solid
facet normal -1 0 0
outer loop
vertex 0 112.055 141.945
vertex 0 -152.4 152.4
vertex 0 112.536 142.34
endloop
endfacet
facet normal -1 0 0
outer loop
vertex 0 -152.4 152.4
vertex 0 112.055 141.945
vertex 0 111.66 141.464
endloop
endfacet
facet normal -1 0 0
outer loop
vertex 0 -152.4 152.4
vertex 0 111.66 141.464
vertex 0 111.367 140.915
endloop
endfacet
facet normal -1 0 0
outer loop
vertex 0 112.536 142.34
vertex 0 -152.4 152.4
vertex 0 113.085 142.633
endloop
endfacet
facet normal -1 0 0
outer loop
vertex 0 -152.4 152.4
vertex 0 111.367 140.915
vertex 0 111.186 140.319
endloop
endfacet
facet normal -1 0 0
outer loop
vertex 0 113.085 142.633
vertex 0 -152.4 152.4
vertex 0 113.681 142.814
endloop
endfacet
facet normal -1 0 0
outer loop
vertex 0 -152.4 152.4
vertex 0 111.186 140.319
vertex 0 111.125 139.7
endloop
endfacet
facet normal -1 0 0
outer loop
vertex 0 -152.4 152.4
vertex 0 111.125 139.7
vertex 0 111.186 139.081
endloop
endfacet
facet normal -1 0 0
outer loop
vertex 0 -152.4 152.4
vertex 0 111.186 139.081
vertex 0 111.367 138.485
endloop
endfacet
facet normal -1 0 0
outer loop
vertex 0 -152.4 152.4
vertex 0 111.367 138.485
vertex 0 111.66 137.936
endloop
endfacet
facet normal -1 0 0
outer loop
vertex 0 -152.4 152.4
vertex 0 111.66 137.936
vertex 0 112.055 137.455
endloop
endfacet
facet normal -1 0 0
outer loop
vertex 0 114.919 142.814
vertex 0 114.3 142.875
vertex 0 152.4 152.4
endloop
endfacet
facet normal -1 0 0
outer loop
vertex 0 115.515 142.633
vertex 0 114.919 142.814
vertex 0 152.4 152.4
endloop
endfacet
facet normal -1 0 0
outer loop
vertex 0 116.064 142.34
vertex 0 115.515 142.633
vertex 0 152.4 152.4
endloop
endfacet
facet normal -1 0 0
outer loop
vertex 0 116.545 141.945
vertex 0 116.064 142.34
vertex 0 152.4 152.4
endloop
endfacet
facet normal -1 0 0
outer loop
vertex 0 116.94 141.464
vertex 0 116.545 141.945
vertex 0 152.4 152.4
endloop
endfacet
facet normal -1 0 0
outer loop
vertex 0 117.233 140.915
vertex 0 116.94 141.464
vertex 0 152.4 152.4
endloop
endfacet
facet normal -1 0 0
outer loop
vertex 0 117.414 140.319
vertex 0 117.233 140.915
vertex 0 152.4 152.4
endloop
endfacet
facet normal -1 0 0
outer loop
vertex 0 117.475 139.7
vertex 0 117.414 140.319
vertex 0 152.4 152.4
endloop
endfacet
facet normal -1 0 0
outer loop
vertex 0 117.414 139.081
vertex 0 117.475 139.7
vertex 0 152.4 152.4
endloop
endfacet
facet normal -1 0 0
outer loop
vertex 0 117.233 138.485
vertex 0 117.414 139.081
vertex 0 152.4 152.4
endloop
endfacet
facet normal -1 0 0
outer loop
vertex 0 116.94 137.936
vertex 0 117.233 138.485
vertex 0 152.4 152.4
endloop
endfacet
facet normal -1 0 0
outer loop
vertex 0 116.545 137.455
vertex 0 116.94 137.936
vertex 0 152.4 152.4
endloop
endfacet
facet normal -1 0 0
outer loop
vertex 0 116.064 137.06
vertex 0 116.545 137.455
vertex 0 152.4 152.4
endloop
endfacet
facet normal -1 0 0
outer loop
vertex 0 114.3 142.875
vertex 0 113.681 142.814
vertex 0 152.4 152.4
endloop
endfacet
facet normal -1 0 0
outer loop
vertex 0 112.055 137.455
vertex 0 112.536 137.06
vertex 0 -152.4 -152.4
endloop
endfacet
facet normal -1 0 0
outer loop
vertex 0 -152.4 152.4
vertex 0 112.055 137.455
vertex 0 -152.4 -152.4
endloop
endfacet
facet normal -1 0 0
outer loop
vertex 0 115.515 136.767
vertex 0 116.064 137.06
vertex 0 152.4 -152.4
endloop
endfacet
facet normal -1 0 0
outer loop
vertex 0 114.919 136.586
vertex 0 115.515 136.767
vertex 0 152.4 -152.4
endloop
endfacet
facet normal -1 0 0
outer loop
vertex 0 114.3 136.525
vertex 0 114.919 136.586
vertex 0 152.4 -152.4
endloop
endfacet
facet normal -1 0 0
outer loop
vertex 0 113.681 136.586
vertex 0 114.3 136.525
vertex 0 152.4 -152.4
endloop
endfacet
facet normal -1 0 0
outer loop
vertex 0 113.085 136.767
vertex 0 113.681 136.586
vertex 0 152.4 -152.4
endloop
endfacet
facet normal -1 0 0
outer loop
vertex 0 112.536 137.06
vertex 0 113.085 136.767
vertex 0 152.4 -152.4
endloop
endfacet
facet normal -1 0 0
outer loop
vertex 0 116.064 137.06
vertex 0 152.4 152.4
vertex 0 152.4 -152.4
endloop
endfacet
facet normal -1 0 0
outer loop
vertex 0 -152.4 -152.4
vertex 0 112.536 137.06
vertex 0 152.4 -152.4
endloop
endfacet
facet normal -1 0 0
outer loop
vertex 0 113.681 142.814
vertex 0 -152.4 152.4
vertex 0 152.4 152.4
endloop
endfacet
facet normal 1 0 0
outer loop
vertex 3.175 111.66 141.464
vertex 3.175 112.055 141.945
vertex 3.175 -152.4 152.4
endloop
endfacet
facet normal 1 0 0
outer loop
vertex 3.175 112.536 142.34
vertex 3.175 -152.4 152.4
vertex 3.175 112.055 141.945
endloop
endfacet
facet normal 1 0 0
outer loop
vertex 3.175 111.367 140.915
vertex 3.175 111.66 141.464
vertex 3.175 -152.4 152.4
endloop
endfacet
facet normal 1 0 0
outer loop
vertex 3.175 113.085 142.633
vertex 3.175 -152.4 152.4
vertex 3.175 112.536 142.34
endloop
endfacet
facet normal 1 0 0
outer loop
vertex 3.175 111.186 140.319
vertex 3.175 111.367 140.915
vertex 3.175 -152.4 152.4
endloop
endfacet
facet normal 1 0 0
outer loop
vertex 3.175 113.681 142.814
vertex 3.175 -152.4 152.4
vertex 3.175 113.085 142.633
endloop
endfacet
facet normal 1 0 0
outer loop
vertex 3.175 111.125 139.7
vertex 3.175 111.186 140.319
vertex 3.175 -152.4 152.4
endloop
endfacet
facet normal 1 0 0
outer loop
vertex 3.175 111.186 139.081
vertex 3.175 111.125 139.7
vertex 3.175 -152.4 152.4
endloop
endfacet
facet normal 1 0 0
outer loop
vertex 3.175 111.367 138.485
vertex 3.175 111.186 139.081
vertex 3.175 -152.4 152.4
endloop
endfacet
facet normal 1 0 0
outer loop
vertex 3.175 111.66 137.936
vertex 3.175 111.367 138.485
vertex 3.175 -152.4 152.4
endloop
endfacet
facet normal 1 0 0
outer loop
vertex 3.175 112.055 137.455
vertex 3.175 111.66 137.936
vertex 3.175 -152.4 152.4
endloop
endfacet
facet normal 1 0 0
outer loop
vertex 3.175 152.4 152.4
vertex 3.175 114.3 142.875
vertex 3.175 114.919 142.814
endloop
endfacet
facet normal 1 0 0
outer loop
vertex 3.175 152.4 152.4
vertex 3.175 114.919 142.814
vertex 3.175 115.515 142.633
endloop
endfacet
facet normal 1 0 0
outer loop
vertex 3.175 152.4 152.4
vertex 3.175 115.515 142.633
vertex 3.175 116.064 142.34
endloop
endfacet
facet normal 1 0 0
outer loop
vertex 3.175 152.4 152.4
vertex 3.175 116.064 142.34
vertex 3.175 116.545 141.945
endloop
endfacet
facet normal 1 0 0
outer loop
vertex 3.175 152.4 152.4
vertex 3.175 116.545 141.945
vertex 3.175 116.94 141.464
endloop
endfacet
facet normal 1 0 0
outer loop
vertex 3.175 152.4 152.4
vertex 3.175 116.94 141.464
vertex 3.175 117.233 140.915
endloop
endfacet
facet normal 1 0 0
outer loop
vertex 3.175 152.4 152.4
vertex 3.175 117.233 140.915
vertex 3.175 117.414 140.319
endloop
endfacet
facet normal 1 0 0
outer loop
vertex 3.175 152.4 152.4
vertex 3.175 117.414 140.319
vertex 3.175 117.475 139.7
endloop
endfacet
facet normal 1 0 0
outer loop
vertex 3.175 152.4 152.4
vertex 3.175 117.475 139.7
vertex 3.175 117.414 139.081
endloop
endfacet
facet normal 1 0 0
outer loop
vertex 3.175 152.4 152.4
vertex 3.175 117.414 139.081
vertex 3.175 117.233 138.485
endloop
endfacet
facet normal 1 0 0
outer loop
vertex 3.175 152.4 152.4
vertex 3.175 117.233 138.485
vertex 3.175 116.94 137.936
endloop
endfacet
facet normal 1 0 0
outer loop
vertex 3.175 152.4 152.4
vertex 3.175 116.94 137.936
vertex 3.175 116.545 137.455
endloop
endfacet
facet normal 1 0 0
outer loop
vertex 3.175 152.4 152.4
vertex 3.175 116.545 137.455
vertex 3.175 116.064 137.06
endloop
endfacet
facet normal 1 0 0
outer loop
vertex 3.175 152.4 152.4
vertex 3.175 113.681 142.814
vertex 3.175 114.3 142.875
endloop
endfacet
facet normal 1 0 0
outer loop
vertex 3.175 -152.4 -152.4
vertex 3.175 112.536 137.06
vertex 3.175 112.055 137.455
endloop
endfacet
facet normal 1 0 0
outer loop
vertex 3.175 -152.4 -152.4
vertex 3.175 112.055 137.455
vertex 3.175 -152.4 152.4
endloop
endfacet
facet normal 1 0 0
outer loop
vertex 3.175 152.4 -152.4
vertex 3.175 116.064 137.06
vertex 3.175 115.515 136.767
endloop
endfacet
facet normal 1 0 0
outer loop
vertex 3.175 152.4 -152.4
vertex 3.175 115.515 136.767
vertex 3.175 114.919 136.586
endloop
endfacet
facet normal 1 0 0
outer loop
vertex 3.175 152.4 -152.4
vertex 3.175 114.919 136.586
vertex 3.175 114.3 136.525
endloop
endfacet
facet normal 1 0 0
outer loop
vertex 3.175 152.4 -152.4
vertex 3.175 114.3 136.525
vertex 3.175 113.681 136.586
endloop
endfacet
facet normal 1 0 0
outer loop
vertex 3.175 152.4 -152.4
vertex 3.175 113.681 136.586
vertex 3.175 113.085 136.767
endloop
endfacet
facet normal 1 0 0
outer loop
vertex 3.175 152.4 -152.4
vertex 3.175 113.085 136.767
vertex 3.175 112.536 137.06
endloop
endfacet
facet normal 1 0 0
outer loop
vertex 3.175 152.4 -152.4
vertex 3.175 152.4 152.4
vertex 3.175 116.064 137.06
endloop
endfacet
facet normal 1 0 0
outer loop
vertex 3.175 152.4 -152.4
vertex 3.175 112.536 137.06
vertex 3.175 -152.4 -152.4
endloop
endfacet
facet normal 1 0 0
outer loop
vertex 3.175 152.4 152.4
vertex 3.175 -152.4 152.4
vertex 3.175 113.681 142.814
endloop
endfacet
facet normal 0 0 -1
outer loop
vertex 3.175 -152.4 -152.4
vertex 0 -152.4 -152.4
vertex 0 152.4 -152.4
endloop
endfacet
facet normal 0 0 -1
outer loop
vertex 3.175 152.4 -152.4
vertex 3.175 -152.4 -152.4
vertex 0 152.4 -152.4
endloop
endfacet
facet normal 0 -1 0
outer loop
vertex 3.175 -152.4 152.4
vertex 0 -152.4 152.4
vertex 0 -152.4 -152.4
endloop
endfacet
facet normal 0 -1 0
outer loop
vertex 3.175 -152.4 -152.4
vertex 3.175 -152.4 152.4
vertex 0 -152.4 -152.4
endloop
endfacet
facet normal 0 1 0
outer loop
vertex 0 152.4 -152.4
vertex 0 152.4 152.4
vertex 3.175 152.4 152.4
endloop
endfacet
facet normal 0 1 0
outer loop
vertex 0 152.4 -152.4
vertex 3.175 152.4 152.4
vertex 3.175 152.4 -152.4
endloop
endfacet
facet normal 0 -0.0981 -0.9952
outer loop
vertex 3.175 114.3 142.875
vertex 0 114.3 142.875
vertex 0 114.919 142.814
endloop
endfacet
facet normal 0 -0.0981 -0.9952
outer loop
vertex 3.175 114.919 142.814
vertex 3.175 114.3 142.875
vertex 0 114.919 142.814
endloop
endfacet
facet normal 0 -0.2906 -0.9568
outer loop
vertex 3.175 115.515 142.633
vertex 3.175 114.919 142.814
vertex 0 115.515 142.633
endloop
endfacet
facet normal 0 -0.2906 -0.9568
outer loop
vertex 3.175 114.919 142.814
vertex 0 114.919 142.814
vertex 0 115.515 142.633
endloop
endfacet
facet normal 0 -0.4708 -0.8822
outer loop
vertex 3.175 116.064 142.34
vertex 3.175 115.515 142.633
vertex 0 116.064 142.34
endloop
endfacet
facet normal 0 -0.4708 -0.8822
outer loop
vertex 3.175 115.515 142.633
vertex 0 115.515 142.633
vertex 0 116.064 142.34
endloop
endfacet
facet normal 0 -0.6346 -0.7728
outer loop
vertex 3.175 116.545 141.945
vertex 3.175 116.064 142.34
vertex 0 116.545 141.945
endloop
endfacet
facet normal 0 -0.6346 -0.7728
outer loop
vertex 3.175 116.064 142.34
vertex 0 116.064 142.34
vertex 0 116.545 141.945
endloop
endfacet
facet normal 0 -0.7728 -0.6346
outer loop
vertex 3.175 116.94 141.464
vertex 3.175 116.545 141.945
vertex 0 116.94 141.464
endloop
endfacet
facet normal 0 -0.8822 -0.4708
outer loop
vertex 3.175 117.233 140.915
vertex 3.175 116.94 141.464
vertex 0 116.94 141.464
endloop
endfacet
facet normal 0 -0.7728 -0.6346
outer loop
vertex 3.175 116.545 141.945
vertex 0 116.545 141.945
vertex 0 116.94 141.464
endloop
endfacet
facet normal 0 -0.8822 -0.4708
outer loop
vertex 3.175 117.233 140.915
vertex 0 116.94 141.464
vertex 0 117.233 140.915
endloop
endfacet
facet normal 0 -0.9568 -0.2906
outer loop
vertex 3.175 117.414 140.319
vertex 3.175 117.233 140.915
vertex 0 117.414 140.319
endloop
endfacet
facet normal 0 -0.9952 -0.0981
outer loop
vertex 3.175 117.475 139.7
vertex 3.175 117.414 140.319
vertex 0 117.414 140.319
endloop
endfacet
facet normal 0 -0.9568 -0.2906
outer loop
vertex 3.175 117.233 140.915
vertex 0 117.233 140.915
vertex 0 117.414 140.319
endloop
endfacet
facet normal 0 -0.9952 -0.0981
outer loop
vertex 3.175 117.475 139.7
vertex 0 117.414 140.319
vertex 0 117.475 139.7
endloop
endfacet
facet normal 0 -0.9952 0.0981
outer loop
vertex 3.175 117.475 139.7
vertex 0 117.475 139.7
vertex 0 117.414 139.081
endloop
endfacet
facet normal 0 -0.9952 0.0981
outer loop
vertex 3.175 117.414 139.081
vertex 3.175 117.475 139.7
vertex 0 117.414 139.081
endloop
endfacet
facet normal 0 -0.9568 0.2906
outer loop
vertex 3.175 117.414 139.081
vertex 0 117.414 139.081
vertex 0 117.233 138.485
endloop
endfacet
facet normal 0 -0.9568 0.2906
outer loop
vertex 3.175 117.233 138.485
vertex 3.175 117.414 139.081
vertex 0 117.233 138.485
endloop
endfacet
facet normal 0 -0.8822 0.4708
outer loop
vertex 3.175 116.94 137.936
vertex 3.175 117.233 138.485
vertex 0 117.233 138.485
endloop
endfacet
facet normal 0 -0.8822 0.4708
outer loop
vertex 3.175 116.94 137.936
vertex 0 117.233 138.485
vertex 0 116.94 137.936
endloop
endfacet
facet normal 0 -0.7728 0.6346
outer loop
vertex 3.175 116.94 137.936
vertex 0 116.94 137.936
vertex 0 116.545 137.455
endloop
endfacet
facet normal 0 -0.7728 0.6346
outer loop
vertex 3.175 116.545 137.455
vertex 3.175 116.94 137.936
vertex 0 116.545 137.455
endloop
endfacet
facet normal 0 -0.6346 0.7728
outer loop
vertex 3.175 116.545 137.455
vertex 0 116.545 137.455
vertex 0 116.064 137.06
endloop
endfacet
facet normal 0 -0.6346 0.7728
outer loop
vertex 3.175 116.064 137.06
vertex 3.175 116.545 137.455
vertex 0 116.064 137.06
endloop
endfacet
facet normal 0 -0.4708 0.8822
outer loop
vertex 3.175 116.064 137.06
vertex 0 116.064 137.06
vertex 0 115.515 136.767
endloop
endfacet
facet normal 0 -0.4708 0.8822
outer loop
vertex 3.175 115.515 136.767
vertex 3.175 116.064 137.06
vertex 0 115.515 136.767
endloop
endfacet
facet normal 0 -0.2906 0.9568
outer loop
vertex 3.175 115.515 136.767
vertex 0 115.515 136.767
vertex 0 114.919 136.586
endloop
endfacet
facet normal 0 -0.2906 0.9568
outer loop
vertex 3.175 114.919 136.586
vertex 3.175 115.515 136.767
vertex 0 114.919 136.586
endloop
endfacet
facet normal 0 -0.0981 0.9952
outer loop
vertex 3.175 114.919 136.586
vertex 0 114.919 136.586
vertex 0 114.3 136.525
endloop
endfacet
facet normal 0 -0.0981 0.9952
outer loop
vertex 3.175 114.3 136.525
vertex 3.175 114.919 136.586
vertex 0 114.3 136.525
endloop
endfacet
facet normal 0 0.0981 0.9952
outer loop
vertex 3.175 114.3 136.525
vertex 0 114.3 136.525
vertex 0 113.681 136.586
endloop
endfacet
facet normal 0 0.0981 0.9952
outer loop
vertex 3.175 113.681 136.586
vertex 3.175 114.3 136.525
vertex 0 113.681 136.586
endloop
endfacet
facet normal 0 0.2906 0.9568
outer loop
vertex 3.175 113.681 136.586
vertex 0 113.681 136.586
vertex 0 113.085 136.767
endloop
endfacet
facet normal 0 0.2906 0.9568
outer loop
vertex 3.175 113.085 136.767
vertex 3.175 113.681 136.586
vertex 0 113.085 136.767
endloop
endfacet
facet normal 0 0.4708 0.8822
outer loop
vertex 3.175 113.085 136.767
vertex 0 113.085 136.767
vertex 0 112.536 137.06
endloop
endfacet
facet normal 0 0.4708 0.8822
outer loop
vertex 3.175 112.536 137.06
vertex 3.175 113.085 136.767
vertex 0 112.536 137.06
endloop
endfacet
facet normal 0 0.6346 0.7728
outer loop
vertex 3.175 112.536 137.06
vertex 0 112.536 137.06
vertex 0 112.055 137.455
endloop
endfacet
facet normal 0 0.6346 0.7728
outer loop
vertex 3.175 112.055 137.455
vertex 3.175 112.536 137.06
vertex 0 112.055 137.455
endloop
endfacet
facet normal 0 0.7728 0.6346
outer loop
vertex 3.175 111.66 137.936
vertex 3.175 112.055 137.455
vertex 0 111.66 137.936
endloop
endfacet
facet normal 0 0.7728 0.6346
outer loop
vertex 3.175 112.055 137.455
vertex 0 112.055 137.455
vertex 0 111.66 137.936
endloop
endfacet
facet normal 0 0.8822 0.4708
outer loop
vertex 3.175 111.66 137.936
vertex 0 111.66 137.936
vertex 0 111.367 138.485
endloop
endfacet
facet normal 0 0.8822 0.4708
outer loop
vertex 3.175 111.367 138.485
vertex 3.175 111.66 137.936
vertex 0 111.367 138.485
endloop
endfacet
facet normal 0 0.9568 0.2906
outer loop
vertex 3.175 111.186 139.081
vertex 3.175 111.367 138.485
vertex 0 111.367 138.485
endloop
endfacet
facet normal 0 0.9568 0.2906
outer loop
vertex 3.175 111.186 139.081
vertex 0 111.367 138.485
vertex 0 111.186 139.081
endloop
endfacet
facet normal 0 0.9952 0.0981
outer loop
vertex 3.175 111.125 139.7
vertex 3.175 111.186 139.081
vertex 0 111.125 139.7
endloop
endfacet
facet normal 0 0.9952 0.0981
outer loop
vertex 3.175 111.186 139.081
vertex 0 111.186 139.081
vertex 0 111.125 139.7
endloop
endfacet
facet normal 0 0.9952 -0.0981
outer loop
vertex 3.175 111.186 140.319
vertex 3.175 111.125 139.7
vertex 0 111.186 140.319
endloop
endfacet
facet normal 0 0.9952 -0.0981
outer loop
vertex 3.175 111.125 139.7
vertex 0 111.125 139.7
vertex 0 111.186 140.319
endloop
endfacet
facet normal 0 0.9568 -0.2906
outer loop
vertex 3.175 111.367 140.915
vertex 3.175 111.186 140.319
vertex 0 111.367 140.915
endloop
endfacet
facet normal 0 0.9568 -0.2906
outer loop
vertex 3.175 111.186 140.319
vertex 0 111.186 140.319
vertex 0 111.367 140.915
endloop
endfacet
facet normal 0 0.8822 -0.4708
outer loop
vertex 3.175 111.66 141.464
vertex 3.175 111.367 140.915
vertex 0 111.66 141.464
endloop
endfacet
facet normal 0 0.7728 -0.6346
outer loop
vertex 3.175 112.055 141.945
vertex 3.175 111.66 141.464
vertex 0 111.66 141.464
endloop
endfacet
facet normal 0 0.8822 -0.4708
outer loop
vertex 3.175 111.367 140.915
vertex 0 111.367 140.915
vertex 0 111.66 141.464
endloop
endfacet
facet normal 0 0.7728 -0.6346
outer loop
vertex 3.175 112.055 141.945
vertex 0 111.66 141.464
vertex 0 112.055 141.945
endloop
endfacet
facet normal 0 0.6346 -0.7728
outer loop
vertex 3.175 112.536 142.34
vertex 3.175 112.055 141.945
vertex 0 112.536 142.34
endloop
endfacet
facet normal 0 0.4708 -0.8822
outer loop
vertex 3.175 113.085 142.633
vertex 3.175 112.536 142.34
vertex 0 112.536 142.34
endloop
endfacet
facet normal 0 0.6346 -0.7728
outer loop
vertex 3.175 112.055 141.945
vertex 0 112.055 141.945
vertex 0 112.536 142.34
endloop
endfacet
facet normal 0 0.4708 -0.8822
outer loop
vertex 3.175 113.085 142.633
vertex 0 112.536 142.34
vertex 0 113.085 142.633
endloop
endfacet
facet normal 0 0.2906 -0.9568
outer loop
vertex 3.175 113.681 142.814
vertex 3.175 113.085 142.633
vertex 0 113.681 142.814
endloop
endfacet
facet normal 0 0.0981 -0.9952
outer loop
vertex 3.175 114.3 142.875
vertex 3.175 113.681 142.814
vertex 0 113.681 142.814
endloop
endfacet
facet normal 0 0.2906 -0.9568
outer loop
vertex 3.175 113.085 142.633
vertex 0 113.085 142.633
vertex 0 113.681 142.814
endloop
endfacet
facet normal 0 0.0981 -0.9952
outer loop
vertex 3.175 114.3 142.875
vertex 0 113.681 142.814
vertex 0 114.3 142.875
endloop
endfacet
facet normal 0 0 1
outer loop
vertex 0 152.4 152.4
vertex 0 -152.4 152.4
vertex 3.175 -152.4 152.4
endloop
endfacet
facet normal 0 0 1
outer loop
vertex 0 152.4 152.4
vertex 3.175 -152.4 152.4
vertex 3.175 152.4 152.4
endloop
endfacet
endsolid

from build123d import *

# Parameters (mm, degrees)
SKETCH1_W           = 304.8
SKETCH1_H           = 304.8
BOSS_EXTRUDE1_DEPTH = 3.175
SKETCH2_R           = 3.175
CUT_EXTRUDE1_DEPTH  = 4.175


with BuildPart() as part:
    # Sketch1 → Boss-Extrude1 (new body)
    with BuildSketch(Plane(origin=(0, 0, 0), x_dir=(0, 0, -1), z_dir=(1, 0, 0))):
        Rectangle(SKETCH1_W, SKETCH1_H)
    extrude(amount=BOSS_EXTRUDE1_DEPTH)

    # Sketch2 → Cut-Extrude1 (cut, through all)
    with BuildSketch(Plane.ZY):
        with Locations((139.7, 114.3)):
            Circle(SKETCH2_R)
    extrude(amount=-CUT_EXTRUDE1_DEPTH, mode=Mode.SUBTRACT)


solid = part.part
